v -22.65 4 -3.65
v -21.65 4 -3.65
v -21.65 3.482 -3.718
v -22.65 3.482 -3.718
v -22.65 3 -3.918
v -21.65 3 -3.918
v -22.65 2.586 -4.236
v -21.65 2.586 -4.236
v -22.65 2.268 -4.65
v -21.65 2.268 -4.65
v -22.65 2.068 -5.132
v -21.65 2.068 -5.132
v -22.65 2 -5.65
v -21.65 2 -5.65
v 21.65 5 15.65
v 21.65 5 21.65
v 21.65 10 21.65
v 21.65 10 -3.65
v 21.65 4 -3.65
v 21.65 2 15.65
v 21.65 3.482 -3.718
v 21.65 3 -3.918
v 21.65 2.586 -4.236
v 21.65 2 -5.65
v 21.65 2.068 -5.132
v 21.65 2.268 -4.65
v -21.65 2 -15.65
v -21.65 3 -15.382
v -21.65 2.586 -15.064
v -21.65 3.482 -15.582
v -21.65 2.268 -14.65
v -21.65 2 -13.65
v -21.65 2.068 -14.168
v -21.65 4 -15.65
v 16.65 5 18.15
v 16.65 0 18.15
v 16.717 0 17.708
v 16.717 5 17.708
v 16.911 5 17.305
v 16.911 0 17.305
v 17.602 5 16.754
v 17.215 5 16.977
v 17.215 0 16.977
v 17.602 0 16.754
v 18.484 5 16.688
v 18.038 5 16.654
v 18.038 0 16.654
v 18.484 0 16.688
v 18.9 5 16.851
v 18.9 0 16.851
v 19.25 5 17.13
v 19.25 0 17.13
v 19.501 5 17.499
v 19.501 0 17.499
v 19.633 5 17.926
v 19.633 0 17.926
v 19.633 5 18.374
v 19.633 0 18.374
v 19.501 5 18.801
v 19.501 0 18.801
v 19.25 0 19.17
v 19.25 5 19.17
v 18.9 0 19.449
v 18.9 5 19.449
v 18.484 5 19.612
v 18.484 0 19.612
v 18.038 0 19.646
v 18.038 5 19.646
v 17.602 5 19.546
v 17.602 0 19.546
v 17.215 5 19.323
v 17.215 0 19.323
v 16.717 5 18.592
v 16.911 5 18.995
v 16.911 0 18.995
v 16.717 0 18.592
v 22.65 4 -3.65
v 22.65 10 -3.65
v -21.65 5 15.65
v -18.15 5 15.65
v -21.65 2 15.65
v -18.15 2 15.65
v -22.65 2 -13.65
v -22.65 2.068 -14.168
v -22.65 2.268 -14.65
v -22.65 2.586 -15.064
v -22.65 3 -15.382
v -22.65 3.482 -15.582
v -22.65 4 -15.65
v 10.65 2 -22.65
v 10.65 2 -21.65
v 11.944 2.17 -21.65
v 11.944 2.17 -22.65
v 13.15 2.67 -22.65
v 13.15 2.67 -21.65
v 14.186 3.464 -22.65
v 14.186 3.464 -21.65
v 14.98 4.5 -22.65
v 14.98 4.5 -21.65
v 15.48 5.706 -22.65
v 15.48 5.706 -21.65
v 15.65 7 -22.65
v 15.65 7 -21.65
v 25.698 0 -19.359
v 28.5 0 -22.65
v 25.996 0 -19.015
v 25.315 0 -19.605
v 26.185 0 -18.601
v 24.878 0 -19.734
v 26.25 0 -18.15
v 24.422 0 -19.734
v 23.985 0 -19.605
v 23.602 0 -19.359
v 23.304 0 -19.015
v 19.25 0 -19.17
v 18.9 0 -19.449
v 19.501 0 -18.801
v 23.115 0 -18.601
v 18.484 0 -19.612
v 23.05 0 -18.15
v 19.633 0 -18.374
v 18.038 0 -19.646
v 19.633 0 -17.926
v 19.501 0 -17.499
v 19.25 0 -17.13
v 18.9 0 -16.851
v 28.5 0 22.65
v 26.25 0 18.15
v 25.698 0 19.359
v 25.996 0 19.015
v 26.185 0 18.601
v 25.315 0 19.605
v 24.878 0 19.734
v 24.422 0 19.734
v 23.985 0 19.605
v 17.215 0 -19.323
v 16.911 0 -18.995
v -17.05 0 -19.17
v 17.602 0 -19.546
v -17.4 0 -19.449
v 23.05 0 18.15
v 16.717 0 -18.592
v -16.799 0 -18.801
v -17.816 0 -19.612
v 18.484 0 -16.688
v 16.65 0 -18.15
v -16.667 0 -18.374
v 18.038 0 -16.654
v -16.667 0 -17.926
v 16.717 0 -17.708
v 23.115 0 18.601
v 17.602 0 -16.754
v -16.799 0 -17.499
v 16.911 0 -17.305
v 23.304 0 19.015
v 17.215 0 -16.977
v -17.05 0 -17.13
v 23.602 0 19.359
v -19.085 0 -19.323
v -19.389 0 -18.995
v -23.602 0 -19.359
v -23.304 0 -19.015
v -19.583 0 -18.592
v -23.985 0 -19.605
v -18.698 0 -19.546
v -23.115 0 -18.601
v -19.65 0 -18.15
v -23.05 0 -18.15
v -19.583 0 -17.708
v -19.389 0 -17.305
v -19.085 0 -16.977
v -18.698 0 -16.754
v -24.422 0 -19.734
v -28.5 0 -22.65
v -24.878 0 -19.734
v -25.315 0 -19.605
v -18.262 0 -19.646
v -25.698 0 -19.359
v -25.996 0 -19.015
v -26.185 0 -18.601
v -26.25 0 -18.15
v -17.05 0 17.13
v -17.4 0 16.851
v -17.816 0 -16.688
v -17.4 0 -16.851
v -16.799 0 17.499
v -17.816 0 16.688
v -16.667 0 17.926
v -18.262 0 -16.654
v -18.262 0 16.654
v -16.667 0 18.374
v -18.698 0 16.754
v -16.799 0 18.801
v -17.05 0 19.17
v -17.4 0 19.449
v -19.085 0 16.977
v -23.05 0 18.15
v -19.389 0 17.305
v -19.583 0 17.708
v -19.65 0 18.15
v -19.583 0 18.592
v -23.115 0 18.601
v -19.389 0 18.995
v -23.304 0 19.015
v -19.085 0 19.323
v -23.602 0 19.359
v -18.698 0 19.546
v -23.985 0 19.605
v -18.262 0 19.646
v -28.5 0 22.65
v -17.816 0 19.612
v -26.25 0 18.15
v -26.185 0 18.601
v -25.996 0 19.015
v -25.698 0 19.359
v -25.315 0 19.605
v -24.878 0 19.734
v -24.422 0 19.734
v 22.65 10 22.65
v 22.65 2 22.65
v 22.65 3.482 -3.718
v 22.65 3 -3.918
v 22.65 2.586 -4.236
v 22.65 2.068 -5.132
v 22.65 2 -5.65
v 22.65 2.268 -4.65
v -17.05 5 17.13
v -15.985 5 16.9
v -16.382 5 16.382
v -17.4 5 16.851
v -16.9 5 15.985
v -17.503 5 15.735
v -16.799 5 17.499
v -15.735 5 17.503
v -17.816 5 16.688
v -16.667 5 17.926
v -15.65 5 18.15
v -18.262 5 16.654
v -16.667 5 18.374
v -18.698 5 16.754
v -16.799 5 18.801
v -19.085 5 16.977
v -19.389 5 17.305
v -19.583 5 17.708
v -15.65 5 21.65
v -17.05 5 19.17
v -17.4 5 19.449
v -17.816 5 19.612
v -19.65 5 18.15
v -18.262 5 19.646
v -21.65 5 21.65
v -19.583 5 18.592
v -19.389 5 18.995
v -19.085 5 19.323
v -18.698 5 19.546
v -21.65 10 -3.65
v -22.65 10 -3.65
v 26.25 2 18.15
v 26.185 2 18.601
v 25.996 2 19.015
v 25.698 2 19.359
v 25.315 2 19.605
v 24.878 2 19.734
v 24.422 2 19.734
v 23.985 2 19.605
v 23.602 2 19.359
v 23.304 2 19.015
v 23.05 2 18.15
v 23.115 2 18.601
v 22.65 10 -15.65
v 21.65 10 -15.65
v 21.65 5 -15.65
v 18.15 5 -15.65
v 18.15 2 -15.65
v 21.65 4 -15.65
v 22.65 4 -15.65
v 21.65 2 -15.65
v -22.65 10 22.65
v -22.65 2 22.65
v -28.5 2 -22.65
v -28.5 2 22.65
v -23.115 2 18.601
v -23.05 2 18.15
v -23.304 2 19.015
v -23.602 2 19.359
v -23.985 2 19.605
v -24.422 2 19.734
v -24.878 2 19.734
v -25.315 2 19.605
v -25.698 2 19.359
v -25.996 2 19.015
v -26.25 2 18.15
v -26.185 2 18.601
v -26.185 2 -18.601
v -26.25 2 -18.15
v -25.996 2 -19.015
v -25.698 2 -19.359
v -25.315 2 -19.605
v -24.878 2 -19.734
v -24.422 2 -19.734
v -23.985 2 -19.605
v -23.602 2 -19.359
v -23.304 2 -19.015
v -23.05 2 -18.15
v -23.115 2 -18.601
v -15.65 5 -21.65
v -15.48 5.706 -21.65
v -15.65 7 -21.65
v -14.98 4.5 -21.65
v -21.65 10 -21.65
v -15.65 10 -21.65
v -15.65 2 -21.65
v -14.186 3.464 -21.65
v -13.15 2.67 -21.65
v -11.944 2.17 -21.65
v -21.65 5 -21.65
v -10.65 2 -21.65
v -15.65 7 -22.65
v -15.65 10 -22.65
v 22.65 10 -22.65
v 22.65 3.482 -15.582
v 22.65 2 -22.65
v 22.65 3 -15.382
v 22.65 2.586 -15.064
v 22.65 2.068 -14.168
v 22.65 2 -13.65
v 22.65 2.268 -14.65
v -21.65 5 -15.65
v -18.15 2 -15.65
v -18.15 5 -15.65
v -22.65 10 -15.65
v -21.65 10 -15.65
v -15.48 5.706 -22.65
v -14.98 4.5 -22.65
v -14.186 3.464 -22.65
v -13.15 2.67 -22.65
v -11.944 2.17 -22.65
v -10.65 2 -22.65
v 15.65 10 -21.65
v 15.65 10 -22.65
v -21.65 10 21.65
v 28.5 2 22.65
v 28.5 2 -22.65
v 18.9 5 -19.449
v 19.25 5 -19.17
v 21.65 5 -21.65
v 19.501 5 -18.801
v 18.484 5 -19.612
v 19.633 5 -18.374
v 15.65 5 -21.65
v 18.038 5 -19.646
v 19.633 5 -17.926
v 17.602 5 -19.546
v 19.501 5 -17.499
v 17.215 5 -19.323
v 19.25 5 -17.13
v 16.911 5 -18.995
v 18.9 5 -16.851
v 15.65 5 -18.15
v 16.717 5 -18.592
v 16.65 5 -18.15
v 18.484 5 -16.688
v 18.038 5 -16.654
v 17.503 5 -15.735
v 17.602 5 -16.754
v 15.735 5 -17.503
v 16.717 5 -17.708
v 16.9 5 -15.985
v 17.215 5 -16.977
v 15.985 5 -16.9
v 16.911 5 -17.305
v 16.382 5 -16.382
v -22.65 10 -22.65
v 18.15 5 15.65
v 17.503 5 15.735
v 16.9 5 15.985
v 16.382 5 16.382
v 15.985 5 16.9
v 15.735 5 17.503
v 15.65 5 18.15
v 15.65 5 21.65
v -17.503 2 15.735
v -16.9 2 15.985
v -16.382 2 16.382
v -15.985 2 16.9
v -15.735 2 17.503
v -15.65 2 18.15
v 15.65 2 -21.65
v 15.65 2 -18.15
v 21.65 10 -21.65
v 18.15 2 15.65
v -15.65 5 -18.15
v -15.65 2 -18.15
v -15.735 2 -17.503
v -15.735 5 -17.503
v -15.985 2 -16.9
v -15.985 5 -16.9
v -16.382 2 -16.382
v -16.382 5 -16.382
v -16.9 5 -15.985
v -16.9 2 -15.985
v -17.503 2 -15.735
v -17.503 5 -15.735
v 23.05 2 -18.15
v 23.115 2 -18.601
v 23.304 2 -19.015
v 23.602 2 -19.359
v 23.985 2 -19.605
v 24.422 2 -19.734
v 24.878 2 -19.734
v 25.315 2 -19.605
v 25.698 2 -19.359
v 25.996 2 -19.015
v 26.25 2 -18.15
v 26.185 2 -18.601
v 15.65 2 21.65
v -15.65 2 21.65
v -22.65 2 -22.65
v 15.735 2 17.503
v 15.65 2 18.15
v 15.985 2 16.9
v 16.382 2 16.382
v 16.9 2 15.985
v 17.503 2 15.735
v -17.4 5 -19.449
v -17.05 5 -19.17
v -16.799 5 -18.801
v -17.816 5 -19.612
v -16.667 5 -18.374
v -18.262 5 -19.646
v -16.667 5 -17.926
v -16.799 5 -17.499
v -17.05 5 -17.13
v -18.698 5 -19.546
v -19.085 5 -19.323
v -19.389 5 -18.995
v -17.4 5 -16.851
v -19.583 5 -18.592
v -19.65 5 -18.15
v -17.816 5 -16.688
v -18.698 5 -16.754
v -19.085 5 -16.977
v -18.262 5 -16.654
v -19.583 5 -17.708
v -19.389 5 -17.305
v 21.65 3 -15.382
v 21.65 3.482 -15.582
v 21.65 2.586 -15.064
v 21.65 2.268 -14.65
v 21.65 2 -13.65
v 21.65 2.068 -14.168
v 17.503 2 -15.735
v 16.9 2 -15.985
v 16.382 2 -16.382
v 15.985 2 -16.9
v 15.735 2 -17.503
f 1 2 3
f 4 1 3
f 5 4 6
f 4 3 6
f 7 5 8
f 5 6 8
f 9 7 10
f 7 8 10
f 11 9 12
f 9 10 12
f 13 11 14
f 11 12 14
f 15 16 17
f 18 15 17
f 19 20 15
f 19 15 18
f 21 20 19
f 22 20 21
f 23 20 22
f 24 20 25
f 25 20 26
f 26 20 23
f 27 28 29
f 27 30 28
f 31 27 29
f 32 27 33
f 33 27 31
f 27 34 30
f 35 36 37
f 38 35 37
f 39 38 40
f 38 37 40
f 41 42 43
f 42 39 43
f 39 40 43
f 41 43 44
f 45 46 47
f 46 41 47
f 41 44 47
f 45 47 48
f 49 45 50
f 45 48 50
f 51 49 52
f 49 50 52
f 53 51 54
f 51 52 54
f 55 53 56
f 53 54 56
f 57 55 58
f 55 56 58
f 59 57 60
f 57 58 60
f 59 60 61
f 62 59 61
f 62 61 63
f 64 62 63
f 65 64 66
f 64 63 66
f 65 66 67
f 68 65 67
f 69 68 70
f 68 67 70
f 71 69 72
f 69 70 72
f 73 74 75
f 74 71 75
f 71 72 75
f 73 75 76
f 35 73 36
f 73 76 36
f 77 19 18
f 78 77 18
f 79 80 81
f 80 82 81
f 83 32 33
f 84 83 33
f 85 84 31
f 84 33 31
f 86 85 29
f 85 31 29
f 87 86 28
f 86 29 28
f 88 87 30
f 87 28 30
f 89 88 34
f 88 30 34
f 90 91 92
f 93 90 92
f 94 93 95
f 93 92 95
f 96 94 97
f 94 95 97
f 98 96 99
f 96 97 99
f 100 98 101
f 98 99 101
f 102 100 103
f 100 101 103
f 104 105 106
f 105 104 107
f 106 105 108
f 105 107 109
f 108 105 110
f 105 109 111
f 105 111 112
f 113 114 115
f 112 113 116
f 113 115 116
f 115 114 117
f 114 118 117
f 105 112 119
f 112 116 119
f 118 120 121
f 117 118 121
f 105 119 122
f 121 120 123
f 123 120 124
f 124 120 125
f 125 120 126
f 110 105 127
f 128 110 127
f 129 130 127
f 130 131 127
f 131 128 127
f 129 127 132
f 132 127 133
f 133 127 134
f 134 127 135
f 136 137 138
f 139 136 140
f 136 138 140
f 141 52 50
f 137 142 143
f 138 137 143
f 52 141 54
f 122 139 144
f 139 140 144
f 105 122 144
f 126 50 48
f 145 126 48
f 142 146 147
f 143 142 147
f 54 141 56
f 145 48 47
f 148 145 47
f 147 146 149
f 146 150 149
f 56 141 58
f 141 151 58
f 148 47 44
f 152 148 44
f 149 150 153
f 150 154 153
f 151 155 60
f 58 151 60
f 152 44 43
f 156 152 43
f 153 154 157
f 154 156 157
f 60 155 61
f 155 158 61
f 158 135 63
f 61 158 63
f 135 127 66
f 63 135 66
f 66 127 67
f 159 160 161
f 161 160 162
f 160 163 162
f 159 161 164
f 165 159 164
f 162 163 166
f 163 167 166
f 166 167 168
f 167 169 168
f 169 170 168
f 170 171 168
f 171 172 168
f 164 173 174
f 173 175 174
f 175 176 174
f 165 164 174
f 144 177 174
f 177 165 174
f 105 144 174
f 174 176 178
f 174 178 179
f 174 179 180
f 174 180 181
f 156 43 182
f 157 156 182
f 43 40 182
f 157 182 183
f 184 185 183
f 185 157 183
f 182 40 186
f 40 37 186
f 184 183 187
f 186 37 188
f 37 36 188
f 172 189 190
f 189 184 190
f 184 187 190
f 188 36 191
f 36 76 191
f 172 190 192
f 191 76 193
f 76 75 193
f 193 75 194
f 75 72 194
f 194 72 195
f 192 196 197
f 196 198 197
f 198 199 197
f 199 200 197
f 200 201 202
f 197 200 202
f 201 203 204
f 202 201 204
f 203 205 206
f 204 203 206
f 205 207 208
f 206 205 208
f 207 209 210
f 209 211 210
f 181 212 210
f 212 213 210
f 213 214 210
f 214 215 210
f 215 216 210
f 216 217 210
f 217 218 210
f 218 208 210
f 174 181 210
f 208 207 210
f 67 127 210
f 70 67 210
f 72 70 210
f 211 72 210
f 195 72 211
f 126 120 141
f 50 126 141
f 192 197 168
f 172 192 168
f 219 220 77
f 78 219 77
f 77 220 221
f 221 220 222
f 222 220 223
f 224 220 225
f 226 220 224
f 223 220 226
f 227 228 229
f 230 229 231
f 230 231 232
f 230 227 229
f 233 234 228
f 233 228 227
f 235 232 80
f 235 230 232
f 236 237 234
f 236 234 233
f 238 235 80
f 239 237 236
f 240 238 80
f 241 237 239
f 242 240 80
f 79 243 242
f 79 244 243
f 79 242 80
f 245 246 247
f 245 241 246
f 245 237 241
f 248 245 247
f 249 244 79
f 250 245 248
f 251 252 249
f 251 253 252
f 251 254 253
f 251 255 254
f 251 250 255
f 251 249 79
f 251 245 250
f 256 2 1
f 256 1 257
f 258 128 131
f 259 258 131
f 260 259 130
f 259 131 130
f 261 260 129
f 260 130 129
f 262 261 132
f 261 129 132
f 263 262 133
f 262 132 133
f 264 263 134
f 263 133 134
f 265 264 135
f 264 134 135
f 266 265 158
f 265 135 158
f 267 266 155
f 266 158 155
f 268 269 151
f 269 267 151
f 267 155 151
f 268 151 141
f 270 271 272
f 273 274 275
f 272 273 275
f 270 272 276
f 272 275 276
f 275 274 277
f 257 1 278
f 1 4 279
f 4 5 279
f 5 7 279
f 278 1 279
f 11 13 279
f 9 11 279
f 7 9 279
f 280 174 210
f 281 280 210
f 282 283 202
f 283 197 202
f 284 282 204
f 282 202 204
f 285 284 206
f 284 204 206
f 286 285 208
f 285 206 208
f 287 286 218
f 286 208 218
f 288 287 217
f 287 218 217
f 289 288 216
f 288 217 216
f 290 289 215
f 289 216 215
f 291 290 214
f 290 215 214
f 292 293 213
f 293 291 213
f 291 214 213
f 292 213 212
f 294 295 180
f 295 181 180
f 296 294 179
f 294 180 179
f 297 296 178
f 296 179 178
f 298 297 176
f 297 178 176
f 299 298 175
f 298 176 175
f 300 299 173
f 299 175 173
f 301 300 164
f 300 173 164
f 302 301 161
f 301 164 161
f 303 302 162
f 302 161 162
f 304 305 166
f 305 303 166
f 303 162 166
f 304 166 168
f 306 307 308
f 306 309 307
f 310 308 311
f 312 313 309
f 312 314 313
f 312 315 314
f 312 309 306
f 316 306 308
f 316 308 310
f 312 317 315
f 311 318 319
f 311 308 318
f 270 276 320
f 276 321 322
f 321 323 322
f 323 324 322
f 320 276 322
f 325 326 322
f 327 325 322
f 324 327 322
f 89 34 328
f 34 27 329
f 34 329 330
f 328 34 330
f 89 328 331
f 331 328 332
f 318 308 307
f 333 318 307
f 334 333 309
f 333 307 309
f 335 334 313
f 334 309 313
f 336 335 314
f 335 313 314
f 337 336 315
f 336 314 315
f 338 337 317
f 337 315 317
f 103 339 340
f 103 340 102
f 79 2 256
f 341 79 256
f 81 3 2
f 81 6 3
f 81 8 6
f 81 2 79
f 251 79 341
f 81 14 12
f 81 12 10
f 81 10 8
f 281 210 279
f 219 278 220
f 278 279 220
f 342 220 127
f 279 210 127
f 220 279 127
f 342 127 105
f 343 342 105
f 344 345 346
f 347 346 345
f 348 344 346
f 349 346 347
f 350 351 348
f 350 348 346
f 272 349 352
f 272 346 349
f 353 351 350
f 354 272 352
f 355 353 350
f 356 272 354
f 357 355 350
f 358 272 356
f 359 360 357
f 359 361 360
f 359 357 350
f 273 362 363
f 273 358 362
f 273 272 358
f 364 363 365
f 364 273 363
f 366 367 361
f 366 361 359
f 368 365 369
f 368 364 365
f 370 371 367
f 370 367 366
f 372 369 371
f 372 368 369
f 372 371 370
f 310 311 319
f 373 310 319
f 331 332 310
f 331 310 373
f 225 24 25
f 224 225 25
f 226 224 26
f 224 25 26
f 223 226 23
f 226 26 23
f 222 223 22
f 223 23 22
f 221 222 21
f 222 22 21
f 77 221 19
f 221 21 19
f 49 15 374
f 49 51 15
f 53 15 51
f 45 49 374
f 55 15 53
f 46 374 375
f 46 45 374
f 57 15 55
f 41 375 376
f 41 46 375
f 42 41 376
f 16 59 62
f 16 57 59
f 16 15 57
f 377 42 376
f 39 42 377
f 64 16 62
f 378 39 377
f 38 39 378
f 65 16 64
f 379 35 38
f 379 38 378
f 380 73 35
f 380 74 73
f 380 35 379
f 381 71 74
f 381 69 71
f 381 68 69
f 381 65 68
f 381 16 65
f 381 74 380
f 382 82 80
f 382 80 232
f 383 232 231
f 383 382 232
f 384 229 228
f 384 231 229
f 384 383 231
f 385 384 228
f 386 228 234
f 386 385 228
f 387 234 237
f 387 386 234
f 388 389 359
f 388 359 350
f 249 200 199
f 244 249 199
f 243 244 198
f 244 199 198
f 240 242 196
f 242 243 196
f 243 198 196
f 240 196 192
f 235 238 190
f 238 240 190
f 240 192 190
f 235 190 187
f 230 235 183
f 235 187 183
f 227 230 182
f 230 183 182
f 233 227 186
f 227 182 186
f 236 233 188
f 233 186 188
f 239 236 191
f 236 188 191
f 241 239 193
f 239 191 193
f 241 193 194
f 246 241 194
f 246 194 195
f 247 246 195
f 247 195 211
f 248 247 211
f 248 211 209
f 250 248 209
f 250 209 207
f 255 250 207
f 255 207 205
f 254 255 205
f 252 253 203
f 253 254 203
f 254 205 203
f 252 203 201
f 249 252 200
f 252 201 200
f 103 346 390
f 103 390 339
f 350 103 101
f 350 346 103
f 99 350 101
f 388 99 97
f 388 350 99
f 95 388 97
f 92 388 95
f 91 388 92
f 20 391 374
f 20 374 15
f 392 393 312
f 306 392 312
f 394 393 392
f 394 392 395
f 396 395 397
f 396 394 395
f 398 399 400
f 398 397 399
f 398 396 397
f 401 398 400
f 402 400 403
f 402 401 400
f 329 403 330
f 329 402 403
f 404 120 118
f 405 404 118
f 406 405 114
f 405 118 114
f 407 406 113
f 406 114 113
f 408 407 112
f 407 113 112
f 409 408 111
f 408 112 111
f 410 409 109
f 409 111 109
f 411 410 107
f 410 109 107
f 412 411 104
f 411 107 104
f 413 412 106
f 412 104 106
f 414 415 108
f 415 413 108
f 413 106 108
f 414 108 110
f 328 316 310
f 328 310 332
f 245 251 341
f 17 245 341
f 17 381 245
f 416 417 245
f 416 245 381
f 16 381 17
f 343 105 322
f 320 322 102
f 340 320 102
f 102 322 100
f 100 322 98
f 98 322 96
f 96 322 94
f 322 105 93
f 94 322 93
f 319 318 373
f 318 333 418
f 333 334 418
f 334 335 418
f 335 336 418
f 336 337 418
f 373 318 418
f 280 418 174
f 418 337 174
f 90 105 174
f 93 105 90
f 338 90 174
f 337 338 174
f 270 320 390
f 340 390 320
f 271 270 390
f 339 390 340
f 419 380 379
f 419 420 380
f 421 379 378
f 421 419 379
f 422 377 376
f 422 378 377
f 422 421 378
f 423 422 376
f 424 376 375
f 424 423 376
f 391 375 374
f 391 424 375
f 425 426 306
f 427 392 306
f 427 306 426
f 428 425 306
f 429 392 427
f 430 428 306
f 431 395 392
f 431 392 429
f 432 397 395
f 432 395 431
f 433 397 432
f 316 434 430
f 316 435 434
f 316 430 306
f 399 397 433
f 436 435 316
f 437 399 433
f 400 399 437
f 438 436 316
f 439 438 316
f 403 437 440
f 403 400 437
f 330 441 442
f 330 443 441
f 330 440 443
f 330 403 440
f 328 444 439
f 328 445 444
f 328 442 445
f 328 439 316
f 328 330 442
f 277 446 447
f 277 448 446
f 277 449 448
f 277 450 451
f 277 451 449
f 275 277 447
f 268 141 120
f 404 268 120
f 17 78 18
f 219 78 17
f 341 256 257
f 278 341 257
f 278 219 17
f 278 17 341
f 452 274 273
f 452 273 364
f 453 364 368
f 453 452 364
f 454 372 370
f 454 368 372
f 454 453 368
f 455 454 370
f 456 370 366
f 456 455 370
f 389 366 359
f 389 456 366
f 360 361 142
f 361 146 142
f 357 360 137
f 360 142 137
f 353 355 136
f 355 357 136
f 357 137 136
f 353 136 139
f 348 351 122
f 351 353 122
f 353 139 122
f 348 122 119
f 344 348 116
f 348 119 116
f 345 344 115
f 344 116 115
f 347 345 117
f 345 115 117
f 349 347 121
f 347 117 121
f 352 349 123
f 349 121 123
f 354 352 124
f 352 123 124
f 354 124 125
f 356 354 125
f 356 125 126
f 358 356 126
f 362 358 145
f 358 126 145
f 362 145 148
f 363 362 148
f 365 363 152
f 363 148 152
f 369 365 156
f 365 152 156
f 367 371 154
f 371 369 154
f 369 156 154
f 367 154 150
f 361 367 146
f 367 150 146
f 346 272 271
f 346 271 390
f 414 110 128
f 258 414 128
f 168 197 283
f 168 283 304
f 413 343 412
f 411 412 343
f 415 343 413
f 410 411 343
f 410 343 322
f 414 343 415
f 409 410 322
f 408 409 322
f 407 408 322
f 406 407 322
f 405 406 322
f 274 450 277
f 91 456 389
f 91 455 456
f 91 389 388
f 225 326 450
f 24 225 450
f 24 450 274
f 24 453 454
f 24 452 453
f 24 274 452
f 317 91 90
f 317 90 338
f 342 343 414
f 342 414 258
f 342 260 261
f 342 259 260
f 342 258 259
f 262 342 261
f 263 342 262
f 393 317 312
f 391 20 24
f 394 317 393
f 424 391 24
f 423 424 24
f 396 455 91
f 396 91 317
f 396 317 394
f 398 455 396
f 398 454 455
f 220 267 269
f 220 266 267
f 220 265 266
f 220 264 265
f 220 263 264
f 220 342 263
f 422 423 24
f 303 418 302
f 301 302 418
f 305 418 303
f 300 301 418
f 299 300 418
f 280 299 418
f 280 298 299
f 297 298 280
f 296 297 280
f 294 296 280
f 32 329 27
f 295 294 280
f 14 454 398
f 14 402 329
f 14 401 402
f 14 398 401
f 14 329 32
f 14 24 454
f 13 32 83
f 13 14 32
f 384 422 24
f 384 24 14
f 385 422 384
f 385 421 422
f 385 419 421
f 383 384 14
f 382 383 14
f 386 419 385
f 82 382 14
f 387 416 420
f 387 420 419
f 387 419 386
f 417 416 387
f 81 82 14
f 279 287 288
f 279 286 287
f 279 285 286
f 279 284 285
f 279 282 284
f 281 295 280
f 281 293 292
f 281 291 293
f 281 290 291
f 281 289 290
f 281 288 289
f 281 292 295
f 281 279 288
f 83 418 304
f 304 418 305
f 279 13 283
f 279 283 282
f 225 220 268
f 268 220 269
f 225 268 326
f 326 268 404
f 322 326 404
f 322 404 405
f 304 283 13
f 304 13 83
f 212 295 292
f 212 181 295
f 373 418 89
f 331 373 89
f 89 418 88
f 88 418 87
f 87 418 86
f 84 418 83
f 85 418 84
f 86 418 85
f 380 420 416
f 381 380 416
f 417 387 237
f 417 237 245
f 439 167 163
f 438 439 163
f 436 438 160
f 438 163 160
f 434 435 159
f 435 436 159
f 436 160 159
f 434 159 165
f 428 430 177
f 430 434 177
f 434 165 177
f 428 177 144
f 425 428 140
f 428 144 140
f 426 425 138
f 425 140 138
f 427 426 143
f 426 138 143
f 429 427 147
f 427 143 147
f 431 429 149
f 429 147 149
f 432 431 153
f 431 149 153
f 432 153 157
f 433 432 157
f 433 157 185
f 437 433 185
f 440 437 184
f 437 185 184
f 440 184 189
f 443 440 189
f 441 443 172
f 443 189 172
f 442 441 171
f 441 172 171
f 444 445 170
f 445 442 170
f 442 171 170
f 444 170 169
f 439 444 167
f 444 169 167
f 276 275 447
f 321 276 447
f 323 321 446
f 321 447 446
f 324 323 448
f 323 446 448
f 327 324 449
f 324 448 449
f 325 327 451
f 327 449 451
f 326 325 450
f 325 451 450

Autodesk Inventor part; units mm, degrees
ref_plane "YZ Plane" through (0, 0, 0) normal (1, 0, 0) x (0, 1, 0)
ref_plane "XZ Plane" through (0, 0, 0) normal (0, 1, 0) x (-1, 0, 0)
ref_plane "XY Plane" through (0, 0, 0) normal (0, 0, 1) x (1, 0, 0)
sketch "Sketch1" plane through (0, 0, 0) normal (0, 1, 0) x (-1, 0, 0)
  line L0 (21.65, 21.65) -> (-21.65, 21.65)
  line L1 (-21.65, 21.65) -> (-21.65, -21.65)
  line L2 (-21.65, -21.65) -> (21.65, -21.65)
  line L3 (21.65, -21.65) -> (21.65, 21.65)
  line L4 (21.65, 21.65) -> (-21.65, -21.65) construction
  line L5 (-21.65, 21.65) -> (21.65, -21.65) construction
  line L6 (22.65, 22.65) -> (-22.65, 22.65)
  line L7 (-22.65, 22.65) -> (-22.65, -22.65)
  line L8 (-22.65, -22.65) -> (22.65, -22.65)
  line L9 (22.65, -22.65) -> (22.65, 22.65)
  line L10 (22.65, 22.65) -> (-22.65, -22.65) construction
  line L11 (-22.65, 22.65) -> (22.65, -22.65) construction
  arc A0 (15.65, 18.15) -> (18.15, 15.65) centre (18.15, 18.15) ccw
  circle A1 centre (18.15, 18.15) radius 1.5
  line L12 (25, 0) -> (-31, 0) construction
  line L13 (0, 28) -> (0, -33) construction
  line L14 (15.65, 18.15) -> (15.65, 21.65)
  line L15 (18.15, 15.65) -> (21.65, 15.65)
  arc A2 (18.15, -15.65) -> (15.65, -18.15) centre (18.15, -18.15) ccw
  circle A3 centre (18.15, -18.15) radius 1.5
  line L16 (15.65, -18.15) -> (15.65, -21.65)
  line L17 (18.15, -15.65) -> (21.65, -15.65)
  arc A4 (-18.15, 15.65) -> (-15.65, 18.15) centre (-18.15, 18.15) ccw
  circle A5 centre (-18.15, 18.15) radius 1.5
  line L18 (-15.65, 18.15) -> (-15.65, 21.65)
  line L19 (-18.15, 15.65) -> (-21.65, 15.65)
  circle A6 centre (-18.15, -18.15) radius 1.5
  line L20 (-18.15, -15.65) -> (-21.65, -15.65)
  line L21 (-15.65, -18.15) -> (-15.65, -21.65)
  arc A7 (-15.65, -18.15) -> (-18.15, -15.65) centre (-18.15, -18.15) ccw
  line L22 (28.5, 22.65) -> (-28.5, 22.65)
  line L23 (-28.5, 22.65) -> (-28.5, -22.65)
  line L24 (-28.5, -22.65) -> (28.5, -22.65)
  line L25 (28.5, -22.65) -> (28.5, 22.65)
  line L26 (28.5, 22.65) -> (-28.5, -22.65) construction
  line L27 (-28.5, 22.65) -> (28.5, -22.65) construction
  line L28 (24.65, 18.15) -> (24.65, -18.15) construction
  line L29 (23.05, 18.15) -> (23.05, -18.15)
  line L30 (26.25, -18.15) -> (26.25, 18.15)
  arc A8 (26.25, 18.15) -> (23.05, 18.15) centre (24.65, 18.15) ccw
  arc A9 (23.05, -18.15) -> (26.25, -18.15) centre (24.65, -18.15) ccw
  line L31 (-24.65, 18.15) -> (-24.65, -18.15) construction
  line L32 (-23.05, 18.15) -> (-23.05, -18.15)
  line L33 (-26.25, -18.15) -> (-26.25, 18.15)
  arc A10 (-23.05, 18.15) -> (-26.25, 18.15) centre (-24.65, 18.15) ccw
  arc A11 (-26.25, -18.15) -> (-23.05, -18.15) centre (-24.65, -18.15) ccw
  point P0 (0, 0)
  point P1 (24.65, 0)
  point P2 (-25, 0)
  point P3 (-24.65, 0)
  point P4 (22.65, 22.65)
  point P5 (22.65, -22.65)
  point P6 (-22.65, -22.65)
  dimension "d0" = 43.3
  dimension "d1" = 43.3
  dimension "d2" = 45.3
  dimension "d3" = 45.3
  dimension "d4" = 5
  dimension "d5" = 3.5
  dimension "d6" = 3.5
  dimension "d7" = 3
  dimension "d14" = 3
  dimension "d15" = 57
  dimension "d16" = 3.2
  dimension "d17" = 2
  dimension "d20" = 45.3
extrude "Extrusion1" add sketch "Sketch1" along normal blind 10 contours L9 L8 L7 L6
extrude "Extrusion2" add sketch "Sketch1" along normal blind 2 contours L14 A0 L15 L3 L17 A2 L16 L2 L21 A7 L20 L1 L19 A4 L18 L0
extrude "Extrusion3" add sketch "Sketch1" along normal blind 5 contours L3 L15 A0 L14 L0 | L18 A4 L19 L1 L0 | L3 L2 L16 A2 L17 | L20 A7 L21 L2 L1
extrude "Extrusion4" add sketch "Sketch1" along normal blind 2 contours L22 L25 L24 L9 | L7 L24 L23 L22
sketch "Sketch2" plane through (-21.65, 10, -21.65) normal (0, 0, 1) x (1, 0, 0)
  line L0 (37.3, -8) -> (37.3, -5) projected
  line L1 (0, 0) -> (43.3, 0) projected
  line L2 (32.3, -8) -> (11, -8)
  line L3 (6, -3) -> (6, 0)
  line L4 (6, 0) -> (37.3, 0)
  line L5 (37.3, 0) -> (37.3, -3)
  arc A0 (6, -3) -> (11, -8) centre (11, -3) ccw
  arc A1 (32.3, -8) -> (37.3, -3) centre (32.3, -3) ccw
  point P0 (21.65, -10)
  point P1 (6, -8)
  point P2 (37.3, -5)
  dimension "d23" = 5
extrude "Extrusion5" cut sketch "Sketch2" against normal blind 2
sketch "Sketch3" plane through (21.65, 10, -21.65) normal (-1, 0, 0) x (0, 0, 1)
  line L0 (6, -8) -> (37.3, -8) projected
  line L1 (8, -8) -> (16, -8)
  line L2 (18, -6) -> (18, 0)
  line L3 (18, 0) -> (6, 0)
  line L4 (6, 0) -> (6, -6)
  arc A0 (6, -6) -> (8, -8) centre (8, -6) ccw
  arc A1 (16, -8) -> (18, -6) centre (16, -6) ccw
  point P0 (21.65, -10)
  dimension "d24" = 2
extrude "Extrusion6" cut sketch "Sketch3" against normal blind 2
sketch "Sketch4" plane through (-21.65, 10, 21.65) normal (1, 0, 0) x (0, 0, -1)
  line L0 (37.3, -8) -> (37.3, -5) projected
  line L1 (44.3, 0) -> (-1, 0) projected
  line L2 (35.3, -8) -> (27.3, -8)
  line L3 (25.3, -6) -> (25.3, 0)
  line L4 (25.3, 0) -> (37.3, 0)
  line L5 (37.3, 0) -> (37.3, -6)
  arc A0 (25.3, -6) -> (27.3, -8) centre (27.3, -6) ccw
  arc A1 (35.3, -8) -> (37.3, -6) centre (35.3, -6) ccw
  point P0 (21.65, -10)
  dimension "d27" = 12
  dimension "d28" = 2
extrude "Extrusion7" cut sketch "Sketch4" against normal blind 2
properties part number "Mounting L298N_3DPrint"
